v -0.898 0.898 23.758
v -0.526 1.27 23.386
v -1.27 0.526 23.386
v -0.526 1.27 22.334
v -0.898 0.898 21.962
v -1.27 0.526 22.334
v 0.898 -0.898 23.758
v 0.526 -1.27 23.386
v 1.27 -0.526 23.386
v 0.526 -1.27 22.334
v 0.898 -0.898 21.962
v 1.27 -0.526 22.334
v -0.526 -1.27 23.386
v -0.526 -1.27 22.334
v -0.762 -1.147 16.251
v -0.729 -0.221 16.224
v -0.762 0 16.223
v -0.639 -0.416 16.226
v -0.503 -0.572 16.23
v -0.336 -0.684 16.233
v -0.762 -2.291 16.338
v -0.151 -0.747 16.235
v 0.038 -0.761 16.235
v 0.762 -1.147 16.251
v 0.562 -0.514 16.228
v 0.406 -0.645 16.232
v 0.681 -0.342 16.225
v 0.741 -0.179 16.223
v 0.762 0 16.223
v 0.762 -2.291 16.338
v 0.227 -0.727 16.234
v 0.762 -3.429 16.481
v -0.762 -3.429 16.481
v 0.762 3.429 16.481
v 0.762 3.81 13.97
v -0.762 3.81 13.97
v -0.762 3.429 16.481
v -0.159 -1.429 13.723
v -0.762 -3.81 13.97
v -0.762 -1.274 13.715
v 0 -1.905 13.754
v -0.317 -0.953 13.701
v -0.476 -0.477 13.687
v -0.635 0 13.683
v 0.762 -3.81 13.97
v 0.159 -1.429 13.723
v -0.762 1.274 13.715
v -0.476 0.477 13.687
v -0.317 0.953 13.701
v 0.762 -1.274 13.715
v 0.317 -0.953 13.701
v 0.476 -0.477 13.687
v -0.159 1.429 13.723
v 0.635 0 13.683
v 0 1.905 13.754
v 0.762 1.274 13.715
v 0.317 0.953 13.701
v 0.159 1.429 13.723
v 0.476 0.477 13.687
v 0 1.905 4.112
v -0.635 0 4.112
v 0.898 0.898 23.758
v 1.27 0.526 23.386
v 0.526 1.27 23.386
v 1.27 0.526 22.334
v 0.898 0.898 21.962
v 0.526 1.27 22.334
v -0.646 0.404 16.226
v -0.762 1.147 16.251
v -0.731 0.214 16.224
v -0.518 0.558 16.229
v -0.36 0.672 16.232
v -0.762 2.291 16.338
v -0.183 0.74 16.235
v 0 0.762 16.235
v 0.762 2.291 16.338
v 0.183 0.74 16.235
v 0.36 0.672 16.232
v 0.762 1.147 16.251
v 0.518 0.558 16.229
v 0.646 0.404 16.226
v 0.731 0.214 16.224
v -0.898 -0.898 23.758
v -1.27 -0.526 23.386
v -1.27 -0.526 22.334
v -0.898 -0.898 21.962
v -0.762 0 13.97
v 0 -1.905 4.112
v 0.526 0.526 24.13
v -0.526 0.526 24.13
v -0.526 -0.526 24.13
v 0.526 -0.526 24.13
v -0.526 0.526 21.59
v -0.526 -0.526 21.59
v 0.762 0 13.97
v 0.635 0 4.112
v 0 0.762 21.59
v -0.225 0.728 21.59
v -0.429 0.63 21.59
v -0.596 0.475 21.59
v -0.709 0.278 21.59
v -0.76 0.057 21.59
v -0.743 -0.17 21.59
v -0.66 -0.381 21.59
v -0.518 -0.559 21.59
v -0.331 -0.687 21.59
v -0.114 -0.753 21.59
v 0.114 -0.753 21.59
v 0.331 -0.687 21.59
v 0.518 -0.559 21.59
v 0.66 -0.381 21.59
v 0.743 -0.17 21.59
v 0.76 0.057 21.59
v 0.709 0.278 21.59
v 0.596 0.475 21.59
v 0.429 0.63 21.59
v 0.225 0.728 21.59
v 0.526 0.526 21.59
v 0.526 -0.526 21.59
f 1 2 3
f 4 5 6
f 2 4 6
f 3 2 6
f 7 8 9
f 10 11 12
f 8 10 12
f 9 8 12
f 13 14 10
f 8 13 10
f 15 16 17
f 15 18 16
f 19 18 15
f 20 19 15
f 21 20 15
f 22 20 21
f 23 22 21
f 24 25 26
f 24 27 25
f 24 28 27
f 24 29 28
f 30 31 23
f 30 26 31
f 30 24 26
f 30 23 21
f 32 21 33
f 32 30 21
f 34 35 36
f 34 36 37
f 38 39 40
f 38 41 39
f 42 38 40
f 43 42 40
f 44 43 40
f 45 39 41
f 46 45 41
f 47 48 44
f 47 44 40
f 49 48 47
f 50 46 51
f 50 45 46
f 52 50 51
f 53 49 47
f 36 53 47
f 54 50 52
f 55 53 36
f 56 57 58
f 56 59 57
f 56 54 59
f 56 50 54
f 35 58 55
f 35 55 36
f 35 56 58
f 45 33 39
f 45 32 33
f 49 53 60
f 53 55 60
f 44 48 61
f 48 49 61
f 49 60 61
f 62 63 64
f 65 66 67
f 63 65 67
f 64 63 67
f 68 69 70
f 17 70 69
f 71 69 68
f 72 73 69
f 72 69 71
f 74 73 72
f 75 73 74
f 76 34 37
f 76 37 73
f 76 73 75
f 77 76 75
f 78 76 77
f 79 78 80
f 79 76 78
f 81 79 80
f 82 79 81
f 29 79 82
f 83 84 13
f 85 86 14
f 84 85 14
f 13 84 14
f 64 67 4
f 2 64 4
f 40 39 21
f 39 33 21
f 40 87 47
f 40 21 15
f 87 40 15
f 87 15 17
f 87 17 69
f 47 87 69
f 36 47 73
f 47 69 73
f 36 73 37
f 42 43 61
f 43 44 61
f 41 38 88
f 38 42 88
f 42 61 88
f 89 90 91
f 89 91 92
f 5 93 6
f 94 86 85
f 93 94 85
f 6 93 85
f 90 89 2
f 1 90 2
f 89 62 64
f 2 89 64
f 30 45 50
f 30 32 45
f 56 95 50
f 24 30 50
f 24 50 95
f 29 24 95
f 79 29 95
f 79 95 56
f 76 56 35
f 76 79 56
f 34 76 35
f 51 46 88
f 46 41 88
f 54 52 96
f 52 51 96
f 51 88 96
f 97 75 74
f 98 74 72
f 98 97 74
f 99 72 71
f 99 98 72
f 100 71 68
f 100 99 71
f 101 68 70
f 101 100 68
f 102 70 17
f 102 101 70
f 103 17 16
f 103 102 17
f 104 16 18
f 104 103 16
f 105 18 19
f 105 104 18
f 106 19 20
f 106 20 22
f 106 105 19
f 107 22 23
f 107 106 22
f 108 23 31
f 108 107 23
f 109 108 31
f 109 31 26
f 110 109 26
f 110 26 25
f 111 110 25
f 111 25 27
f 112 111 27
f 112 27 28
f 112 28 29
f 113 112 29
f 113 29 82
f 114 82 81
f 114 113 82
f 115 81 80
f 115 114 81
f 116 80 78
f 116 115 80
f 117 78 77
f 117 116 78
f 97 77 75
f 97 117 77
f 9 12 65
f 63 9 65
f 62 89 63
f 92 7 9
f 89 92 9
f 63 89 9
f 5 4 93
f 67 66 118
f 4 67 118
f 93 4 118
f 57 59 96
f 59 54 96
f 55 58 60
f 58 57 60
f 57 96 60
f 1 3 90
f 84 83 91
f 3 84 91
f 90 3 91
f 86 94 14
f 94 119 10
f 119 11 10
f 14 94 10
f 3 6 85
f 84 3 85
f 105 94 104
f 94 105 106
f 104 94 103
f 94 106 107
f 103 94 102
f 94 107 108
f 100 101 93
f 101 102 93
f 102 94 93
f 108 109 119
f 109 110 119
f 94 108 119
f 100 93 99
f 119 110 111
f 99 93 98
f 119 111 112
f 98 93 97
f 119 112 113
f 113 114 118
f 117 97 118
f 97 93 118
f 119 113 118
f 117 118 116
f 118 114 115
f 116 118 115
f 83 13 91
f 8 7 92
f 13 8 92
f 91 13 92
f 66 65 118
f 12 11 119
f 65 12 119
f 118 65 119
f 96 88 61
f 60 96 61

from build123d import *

# Parameters (mm, degrees)
F0_R      = 6.35
F1_DEPTH  = 1.5875
F2_R      = 6.35
F2_R_2    = 5.715
F3_DEPTH  = 0.79375
F5_DEPTH  = 12.7
F7_DEPTH  = 0.762
F8_W      = 0.762
F8_H      = 7.62
F11_DEPTH = 2.54
F13_DEPTH = 25.4
F15_DEPTH = 7.621
F16_W     = 24.9132402241
F16_H     = 7.0053068921
F17_DEPTH = 12.7


# Not quite as in the source:
# - a feature names something its author has since deleted; it is built from what else it names


with BuildPart() as f1:
    # F0 (on Top) → F1 (new body)
    with BuildSketch(Plane.XY):
        Circle(F0_R)
    extrude(amount=F1_DEPTH)

    # F2 (on face) → F3 (join)
    with BuildSketch(Plane.XY.offset(1.5875)):
        Circle(F2_R)
        Circle(F2_R_2, mode=Mode.SUBTRACT)
        with BuildLine():
            add(Edge.make_bspline(
                [(2.9683180619, -0.4757996358), (2.843389073, -0.4786165828), (2.7050840949, -0.5086647904), (2.5873180619, -0.5161623703)],
                knots=[0.409339872, 0.409339872, 0.409339872, 0.409339872, 0.4280905329, 0.4280905329, 0.4280905329, 0.4280905329], degree=3))
            add(Edge.make_bspline(
                [(2.5873180619, -0.5161623703), (2.4915986751, -0.5222563495), (2.3352190965, -0.5054979102), (2.1335509903, -0.5700528844), (1.886210527, -0.6696578597), (1.7267290127, -0.8313152566), (1.6781527788, -1.0212940602), (1.5990320903, -1.1897273451), (1.6464089719, -1.2957044031), (1.5599711629, -1.4279363767), (1.5051186748, -1.5717824942), (1.450980873, -1.6442395094), (1.453928646, -1.7165163565), (1.513053832, -1.7807591134), (1.5434308822, -1.8303185726), (1.576198943, -1.9162350186), (1.5055990352, -1.9919946196), (1.4668165836, -2.0222182295), (1.4097694676, -2.0618705924), (1.4071401198, -2.0762813928), (1.407019912, -2.0936682429), (1.4054410858, -2.1159814671), (1.4256709316, -2.1343567811), (1.4482180902, -2.1520382899), (1.5329915239, -2.3033090939), (1.6303822196, -2.3814989965), (1.5935632797, -2.4623744081), (1.5348318369, -2.4983128964), (1.4776982069, -2.5441298885), (1.455742429, -2.5511454253), (1.4798178263, -2.5621456444), (1.4948688399, -2.5838079134), (1.5251861888, -2.6046329809), (1.4935773749, -2.6345303194), (1.4713860455, -2.6758526458), (1.4221955197, -2.712885243), (1.3936565716, -2.7915463541), (1.4945229102, -2.8204202545), (1.6288484983, -2.8640100665), (1.7728549214, -2.853346582), (1.9116412442, -2.8061555548), (2.0472725737, -2.770170597), (2.2043787565, -2.7459265468), (2.3033355203, -2.7551939211), (2.3339263508, -2.8073911697), (2.353376687, -2.8775353249), (2.3257401171, -2.9468505336), (2.3037614678, -3.0393999235), (2.1498886548, -3.0666616669), (2.0714102198, -3.0904863786), (1.9727168734, -3.1134789891), (1.7843150368, -3.140535518), (1.6436061221, -3.1389483141), (1.5234236482, -3.1049579495), (1.4521295971, -3.0857303745), (1.4124230671, -3.1305535957), (1.4949213438, -3.1891776378), (1.5227733168, -3.2831967132), (1.4841449535, -3.3566867509), (1.4775180681, -3.4518910587), (1.4608440665, -3.566216612), (1.549729833, -3.6446920788), (1.8994677395, -3.667719288), (2.0536618712, -3.5673701183), (2.086254186, -3.5448411945)],
                knots=[0.4280905329, 0.4280905329, 0.4280905329, 0.4280905329, 0.4433309355, 0.457101701, 0.472691433, 0.4868290747, 0.5002944463, 0.5129981027, 0.5225928523, 0.5342722129, 0.5463608736, 0.5552384945, 0.5629095325, 0.5716491532, 0.5791344546, 0.5877870081, 0.596979654, 0.6042024841, 0.6118646332, 0.6153039035, 0.6192184677, 0.6236552276, 0.6283160232, 0.6333712575, 0.6459326281, 0.6564149698, 0.6642919572, 0.6725026939, 0.6807518007, 0.684185616, 0.6882292359, 0.6934969149, 0.6985507014, 0.7041050254, 0.7107743014, 0.7183805652, 0.7259377484, 0.7347425449, 0.7463542944, 0.7577985049, 0.7693099164, 0.780784325, 0.7929687375, 0.8020678672, 0.8090716285, 0.8170400104, 0.8252507415, 0.834055538, 0.845515778, 0.8543322878, 0.8638427207, 0.8770648317, 0.8886457092, 0.899333178, 0.9072373981, 0.9129559403, 0.9218532611, 0.9311181429, 0.9395692705, 0.9490169241, 0.9588418554, 0.9683094215, 0.9861710617, 1, 1, 1, 1], degree=3))
            add(Edge.make_bspline(
                [(2.086254186, -3.5448411945), (2.1011047055, -3.5345760071), (2.1201833918, -3.5199789546), (2.2133903471, -3.4742318908), (2.3333214203, -3.4513666992), (2.4607568415, -3.4062321353), (2.6387662736, -3.3641035898), (2.7563669715, -3.3392389367), (2.8861628847, -3.3278317932), (2.9202917573, -3.1985664964), (2.9487510475, -3.0806210272), (2.9453740986, -2.8830592898), (2.9475003966, -2.7801627945), (3.0024526725, -2.634440086), (3.0665778639, -2.4862895949), (3.1278419801, -2.4963691695), (3.2148748542, -2.5174044884), (3.2670738053, -2.6357726537), (3.300079047, -2.7251932385), (3.4018745991, -2.7381242004), (3.5380519165, -2.7491446387), (3.665083714, -2.6861808801), (3.7982425029, -2.6394629665), (3.9059135519, -2.5530868531), (4.0451426633, -2.4694400612), (4.1647565761, -2.2912192854), (4.2419872332, -2.1073390896), (4.3180155802, -1.9393229235), (4.3188699133, -1.6520894893), (4.249875342, -1.4134518517), (4.1905089106, -1.1973159772), (4.0374858266, -0.958444693), (3.8993633614, -0.7738144821), (3.5856153955, -0.5701629325), (3.286341595, -0.5131462763), (3.0825055806, -0.4732248916), (2.9683180619, -0.4757996358)],
                knots=[0, 0, 0, 0, 0.0063010841, 0.0157194351, 0.0263949763, 0.0376453369, 0.0505479911, 0.0613137498, 0.071480671, 0.0817330319, 0.0926649823, 0.1059401058, 0.1157236868, 0.1278653869, 0.1394743491, 0.1461226676, 0.1548216508, 0.1655548739, 0.1745318922, 0.1836808664, 0.1948523405, 0.2062053504, 0.2175283386, 0.2286731355, 0.2407902953, 0.2547394428, 0.2682405406, 0.2811697816, 0.2972000982, 0.3123569589, 0.3266907485, 0.3425591711, 0.3572627122, 0.3754272219, 0.3922014044, 0.409339872, 0.409339872, 0.409339872, 0.409339872], degree=3))
        make_face()
        with BuildLine():
            add(Edge.make_bspline(
                [(1.6971518053, -1.7743168864), (1.6817021758, -1.7925924294), (1.6769970047, -1.8625052871), (1.729693431, -1.9463010045), (1.7845566819, -2.0039238946), (1.7796195304, -2.0789246327), (1.7537680377, -2.1257688745), (1.8014879536, -2.2093126279), (1.9177102455, -2.1779080217), (1.965096075, -2.0707704095), (1.9605129281, -1.9856512165), (1.9580791022, -1.8944092615), (1.8839995072, -1.8212095405), (1.8202543113, -1.7813944492), (1.7573140981, -1.749016499), (1.7102858438, -1.7587804824), (1.6971518053, -1.7743168864)],
                knots=[0, 0, 0, 0, 0.0723902032, 0.1521785163, 0.2220894047, 0.2876074386, 0.3444825904, 0.4130481958, 0.4920977039, 0.5756332962, 0.6493011321, 0.723443126, 0.8024927151, 0.8724037498, 0.9384596426, 1, 1, 1, 1], degree=3))
        make_face(mode=Mode.SUBTRACT)
        with BuildLine():
            add(Edge.make_bspline(
                [(-2.4699478998, -0.4572949838), (-2.5708650863, -0.4563367572), (-2.7369839982, -0.4424518124), (-2.9380629804, -0.5061475005), (-3.1861355879, -0.6061766595), (-3.3454329941, -0.7677273894), (-3.3940542763, -0.9577322927), (-3.4731643105, -1.1261594047), (-3.4257896257, -1.2321377355), (-3.5122267839, -1.364369332), (-3.5670794532, -1.5082155546), (-3.6212172198, -1.5806725493), (-3.6182694543, -1.6529494008), (-3.5591442662, -1.7171921565), (-3.5287672166, -1.766751616), (-3.4959991555, -1.8526680619), (-3.5665990634, -1.9284276629), (-3.605381515, -1.9586512728), (-3.662428631, -1.9983036357), (-3.6650579788, -2.0127144361), (-3.6651781866, -2.0301012863), (-3.6667570128, -2.0524145104), (-3.646527167, -2.0707898244), (-3.6239800084, -2.0884713333), (-3.5392065747, -2.2397421372), (-3.441815879, -2.3179320399), (-3.4786348188, -2.3988074514), (-3.5373662617, -2.4347459398), (-3.5944998917, -2.4805629318), (-3.6164556696, -2.4875784687), (-3.5923802723, -2.4985786877), (-3.5773292587, -2.5202409567), (-3.5470119098, -2.5410660242), (-3.5786207237, -2.5709633628), (-3.600812053, -2.6122856891), (-3.6500025789, -2.6493182863), (-3.678541527, -2.7279793974), (-3.5776751884, -2.7568532979), (-3.4433496003, -2.8004431099), (-3.2993431772, -2.7897796254), (-3.1605568544, -2.7425885981), (-3.0249255249, -2.7066036403), (-2.8678193421, -2.6823595901), (-2.7688625783, -2.6916269644), (-2.7382717478, -2.743824213), (-2.7188214116, -2.8139683683), (-2.7464579815, -2.8832835769), (-2.7684366308, -2.9758329669), (-2.9223094438, -3.0030947102), (-3.0007878788, -3.026919422), (-3.0994812252, -3.0499120324), (-3.2878830618, -3.0769685613), (-3.4285919765, -3.0753813574), (-3.5487744504, -3.0413909928), (-3.6200685015, -3.0221634179), (-3.6597750314, -3.066986639), (-3.5772767548, -3.1256106812), (-3.5494247818, -3.2196297565), (-3.5880531451, -3.2931197942), (-3.5946800305, -3.388324102), (-3.6113540321, -3.5026496554), (-3.5224682656, -3.5811251221), (-3.1727303591, -3.6041523313), (-3.0185362274, -3.5038031616), (-2.9859439126, -3.4812742379)],
                knots=[0.4276093612, 0.4276093612, 0.4276093612, 0.4276093612, 0.4432926757, 0.4570643878, 0.4726551912, 0.4867938046, 0.5002601016, 0.5129646311, 0.5225600402, 0.5342402035, 0.5463296951, 0.5552079262, 0.5628794914, 0.5716197128, 0.5791055286, 0.5877586768, 0.5969519545, 0.604175281, 0.6118379567, 0.6152774634, 0.6191922967, 0.6236293616, 0.6282904775, 0.6333460592, 0.6459082931, 0.6563913553, 0.6642688841, 0.6724801851, 0.6807298588, 0.6841639101, 0.688207808, 0.693475849, 0.6985299829, 0.7040846887, 0.710754423, 0.7183612095, 0.7259189122, 0.7347243139, 0.7463368614, 0.7577818585, 0.7692940611, 0.7807692583, 0.7929545082, 0.8020542633, 0.809058506, 0.8170274356, 0.825238731, 0.8340441327, 0.8455051603, 0.8543222761, 0.8638333627, 0.8770563824, 0.8886380559, 0.8993262592, 0.9072310226, 0.9129499578, 0.9218478901, 0.9311134087, 0.9395651171, 0.9490134201, 0.9588390266, 0.9683072434, 0.9861701112, 1, 1, 1, 1], degree=3))
            add(Edge.make_bspline(
                [(-2.9859439126, -3.4812742379), (-2.9710933931, -3.4710090504), (-2.9520147068, -3.456411998), (-2.8588077515, -3.4106649341), (-2.7388766783, -3.3877997425), (-2.6114412571, -3.3426651787), (-2.433431825, -3.3005366331), (-2.3158311271, -3.27567198), (-2.1860352139, -3.2642648366), (-2.1519063413, -3.1349995397), (-2.1234470511, -3.0170540705), (-2.1268239999, -2.8194923331), (-2.1246977019, -2.7165958378), (-2.0697454261, -2.5708731293), (-2.0056202347, -2.4227226382), (-1.9443561185, -2.4328022129), (-1.8573232444, -2.4538375317), (-1.8051242933, -2.5722056971), (-1.7721190516, -2.6616262819), (-1.6703234995, -2.6745572438), (-1.5341461821, -2.685577682), (-1.4071143845, -2.6226139237), (-1.2739555958, -2.5758960088), (-1.1662845461, -2.4895199003), (-1.0270554378, -2.4058730873), (-0.9074415115, -2.2276524028), (-0.830210904, -2.0437718725), (-0.7541823669, -1.8757569873), (-0.753328888, -1.5885177996), (-0.8223203653, -1.3499010029), (-0.8816979637, -1.1336899083), (-1.0346766678, -0.8951175642), (-1.1729684536, -0.7093468208), (-1.4859704608, -0.5107200004), (-1.7852685997, -0.4361256058), (-1.9796795123, -0.4407184694), (-2.0889478998, -0.4452950088)],
                knots=[0, 0, 0, 0, 0.0063015172, 0.0157205155, 0.0263967904, 0.0376479243, 0.0505514652, 0.0613179639, 0.0714855839, 0.0817386494, 0.0926713511, 0.1059473871, 0.1157316405, 0.1278741751, 0.1394839351, 0.1461327105, 0.1548322917, 0.1655662524, 0.1745438878, 0.1836934908, 0.1948657327, 0.2062195229, 0.2175432893, 0.2286888521, 0.2408068447, 0.254756951, 0.2682589767, 0.2811891063, 0.2972205247, 0.3123784271, 0.3267132019, 0.3425827151, 0.3572872668, 0.3754530249, 0.3922283603, 0.4089050235, 0.4089050235, 0.4089050235, 0.4089050235], degree=3))
            add(Edge.make_bspline(
                [(-2.0889478998, -0.4452950088), (-2.2115019627, -0.4504279985), (-2.3495913807, -0.4584377902), (-2.4699478998, -0.4572949838)],
                knots=[0.4089050235, 0.4089050235, 0.4089050235, 0.4089050235, 0.4276093612, 0.4276093612, 0.4276093612, 0.4276093612], degree=3))
        make_face()
        with BuildLine():
            add(Edge.make_bspline(
                [(-3.3750462933, -1.7107499298), (-3.3904959228, -1.7290254728), (-3.3952010939, -1.7989383304), (-3.3425046676, -1.8827340479), (-3.2876414167, -1.940356938), (-3.2925785682, -2.015357676), (-3.3184300609, -2.0622019178), (-3.270710145, -2.1457456712), (-3.1544878531, -2.114341065), (-3.1071020236, -2.0072034528), (-3.1116851705, -1.9220842599), (-3.1141189964, -1.8308423049), (-3.1881985914, -1.7576425838), (-3.2519437873, -1.7178274925), (-3.3148840005, -1.6854495423), (-3.3619122548, -1.6952135257), (-3.3750462933, -1.7107499298)],
                knots=[0, 0, 0, 0, 0.0723902032, 0.1521785163, 0.2220894047, 0.2876074386, 0.3444825904, 0.4130481958, 0.4920977039, 0.5756332962, 0.6493011321, 0.723443126, 0.8024927151, 0.8724037498, 0.9384596426, 1, 1, 1, 1], degree=3))
        make_face(mode=Mode.SUBTRACT)
        with BuildLine():
            add(Edge.make_bspline(
                [(-2.0889478998, -0.4452950088), (-2.2115019627, -0.4504279985), (-2.3495913807, -0.4584377902), (-2.4699478998, -0.4572949838)],
                knots=[0.4089050235, 0.4089050235, 0.4089050235, 0.4089050235, 0.4276093612, 0.4276093612, 0.4276093612, 0.4276093612], degree=3))
            Line((-2.0889478998, -0.4452950088), (-2.0889478998, 3.3454788989))
            Line((-2.0889478998, 3.3454788989), (2.5873180619, 3.3454788989))
            Line((2.5873180619, 3.3454788989), (2.5873180619, -0.5161623703))
            add(Edge.make_bspline(
                [(2.9683180619, -0.4757996358), (2.843389073, -0.4786165828), (2.7050840949, -0.5086647904), (2.5873180619, -0.5161623703)],
                knots=[0.409339872, 0.409339872, 0.409339872, 0.409339872, 0.4280905329, 0.4280905329, 0.4280905329, 0.4280905329], degree=3))
            Line((2.9683180619, -0.4757996358), (2.9683180619, 3.7264788989))
            Line((2.9683180619, 3.7264788989), (-2.4699478998, 3.7264788989))
            Line((-2.4699478998, 3.7264788989), (-2.4699478998, -0.4572949838))
        make_face()
        with BuildLine():
            Line((-3.550226207, -2.9001818039), (-3.550226207, -2.8240964748))
            ThreePointArc((-3.550226207, -2.8240964748), (-3.6131554429, -2.8177576011), (-3.6389924242, -2.8754873201))
            Line((-3.6389924242, -2.8754873201), (-3.550226207, -2.9001818039))
        make_face()
        with BuildLine():
            Line((-3.5515612579, -2.9365690425), (-3.6409947677, -2.9101930559))
            ThreePointArc((-3.6409947677, -2.9101930559), (-3.6144088936, -2.9743756743), (-3.550226207, -3.0009613838))
            Line((-3.550226207, -3.0009613838), (-3.5515612579, -2.9365690425))
        make_face()
        Polygon((-3.4440558991, -2.9486666899), (-3.5156634292, -2.9365690425), (-3.5175228148, -3.00363102), (-3.4440558991, -3.0129749794), align=None)
        Polygon((-3.443260084, -2.8461508919), (-3.5195409908, -2.832378028), (-3.5195409908, -2.903361572), (-3.443260084, -2.9181940481), align=None)
        Polygon((-3.3330767072, -2.8514482547), (-3.4114763728, -2.849329263), (-3.4114763728, -2.9171344358), (-3.3330767072, -2.920312807), align=None)
        Polygon((-3.3340308471, -3.0290670693), (-3.3340308471, -2.9517051298), (-3.4147564909, -2.9517051298), (-3.4147564909, -3.0172944535), align=None)
        Polygon((-3.2263969659, -3.028226085), (-3.2272379501, -2.9517051298), (-3.300395201, -2.9517051298), (-3.300395201, -3.028226085), align=None)
        Polygon((-3.2250125549, -2.8408537619), (-3.301292996, -2.849329263), (-3.301292996, -2.9192534275), (-3.2239527098, -2.9192534275), align=None)
        Polygon((-3.1221265561, -2.8121171053), (-3.195283807, -2.8314576484), (-3.195283807, -2.9155467637), (-3.1221265561, -2.8995696921), align=None)
        Polygon((-3.1212855718, -3.011408262), (-3.1204445875, -2.9365690425), (-3.1927613198, -2.9466596898), (-3.1919203355, -3.0214989092), align=None)
        Polygon((-3.005242779, -2.9836588074), (-3.0086062505, -2.9075582279), (-3.0876499257, -2.9239556752), (-3.0859684228, -3.0046810862), align=None)
        Polygon((-3.0060837633, -2.768390812), (-3.0859684228, -2.7952992823), (-3.0859684228, -2.8920017648), (-3.0060837633, -2.8692977503), align=None)
        Polygon((-2.9043358407, -2.7322324459), (-2.9766525729, -2.7549366932), (-2.9766525729, -2.859207103), (-2.9043358407, -2.8314576484), align=None)
        Polygon((-2.9758115886, -2.9744091444), (-2.9043358407, -2.9483414255), (-2.9043358407, -2.868456766), (-2.9758115886, -2.8920017648), align=None)
        with BuildLine():
            ThreePointArc((-2.8761449157, -2.9407734983), (-2.7976867204, -2.8913213797), (-2.7672707691, -2.8037081938))
            Line((-2.7672707691, -2.8037081938), (-2.8761449157, -2.8519913538))
            Line((-2.8761449157, -2.8519913538), (-2.8761449157, -2.9407734983))
        make_face()
        with BuildLine():
            ThreePointArc((-2.7748386963, -2.7717545163), (-2.8160666547, -2.7335813761), (-2.8715411789, -2.7246645186))
            Line((-2.8715411789, -2.7246645186), (-2.8715411789, -2.8146398254))
            Line((-2.8715411789, -2.8146398254), (-2.7748386963, -2.7717545163))
        make_face()
        with BuildLine():
            ThreePointArc((2.2973594023, -2.835321473), (2.2561314439, -2.7971483328), (2.2006569197, -2.7882314753))
            Line((2.2006569197, -2.7882314753), (2.2006569197, -2.878206782))
            Line((2.2006569197, -2.878206782), (2.2973594023, -2.835321473))
        make_face()
        with BuildLine():
            ThreePointArc((2.1960531829, -3.0043404549), (2.2745113782, -2.9548883364), (2.3049273295, -2.8672751505))
            Line((2.3049273295, -2.8672751505), (2.1960531829, -2.9155583104))
            Line((2.1960531829, -2.9155583104), (2.1960531829, -3.0043404549))
        make_face()
        Polygon((2.0963865099, -3.037976101), (2.1678622579, -3.0119083822), (2.1678622579, -2.9320237227), (2.0963865099, -2.9555687215), align=None)
        Polygon((2.1678622579, -2.7957994025), (2.0955455257, -2.8185036499), (2.0955455257, -2.9227740597), (2.1678622579, -2.8950246051), align=None)
        Polygon((2.0661143353, -2.8319577686), (1.9862296758, -2.858866239), (1.9862296758, -2.9555687215), (2.0661143353, -2.932864707), align=None)
        Polygon((2.0669553196, -3.047225764), (2.0635918481, -2.9711251846), (1.9845481729, -2.9875226319), (1.9862296758, -3.0682480428), align=None)
        Polygon((1.9509125268, -3.0749752186), (1.9517535111, -3.0001359992), (1.8794367788, -3.0102266464), (1.8802777631, -3.0850658659), align=None)
        Polygon((1.9500715425, -2.875684062), (1.8769142916, -2.8950246051), (1.8769142916, -2.9791137204), (1.9500715425, -2.9631366488), align=None)
        Polygon((1.8471855437, -2.9044207186), (1.7709051026, -2.9128962196), (1.7709051026, -2.9828203842), (1.8482453888, -2.9828203842), align=None)
        Polygon((1.8458011327, -3.0917930417), (1.8449601484, -3.0152720865), (1.7718028976, -3.0152720865), (1.7718028976, -3.0917930417), align=None)
        Polygon((1.7381672515, -3.092634026), (1.7381672515, -3.0152720865), (1.6574416077, -3.0152720865), (1.6574416077, -3.0808614101), align=None)
        Polygon((1.7391213914, -2.9150152113), (1.6607217258, -2.9128962196), (1.6607217258, -2.9807013925), (1.7391213914, -2.9838797636), align=None)
        Polygon((1.6289380146, -2.9097178485), (1.5526571078, -2.8959449846), (1.5526571078, -2.9669285286), (1.6289380146, -2.9817610048), align=None)
        Polygon((1.6281421995, -3.0122336466), (1.5565346694, -3.0001359992), (1.5546752838, -3.0671979766), (1.6281421995, -3.076541936), align=None)
        with BuildLine():
            Line((1.5206368407, -3.0001359992), (1.4312033309, -2.9737600125))
            ThreePointArc((1.4312033309, -2.9737600125), (1.457789205, -3.037942631), (1.5219718916, -3.0645283405))
            Line((1.5219718916, -3.0645283405), (1.5206368407, -3.0001359992))
        make_face()
        with BuildLine():
            Line((1.5219718916, -2.9637487605), (1.5219718916, -2.8876634315))
            ThreePointArc((1.5219718916, -2.8876634315), (1.4590426557, -2.8813245578), (1.4332056744, -2.9390542768))
            Line((1.4332056744, -2.9390542768), (1.5219718916, -2.9637487605))
        make_face()
    extrude(amount=F3_DEPTH)

    # F4 (on face) → F5 (join)
    with BuildSketch(Plane.XY.offset(1.5875)):
        Polygon((0.635, 0), (0, 1.905), (-0.635, 0), (0, -1.905), align=None)
    extrude(amount=F5_DEPTH)

    # F6 (on Right) → F7 (join, symmetric)
    with BuildSketch(Plane.YZ):
        with BuildLine():
            ThreePointArc((-3.81, 13.97), (0, 13.6826243153), (3.81, 13.97))
            Line((3.81, 13.97), (3.429, 16.4812624315))
            ThreePointArc((3.429, 16.4812624315), (0, 16.2226243153), (-3.429, 16.4812624315))
            Line((-3.429, 16.4812624315), (-3.81, 13.97))
        make_face()
    extrude(amount=F7_DEPTH, both=True)

    # F8 (on Right) → F9 (revolve)
    with BuildSketch(Plane.YZ):
        with Locations((0.381, 17.78)):
            Rectangle(F8_W, F8_H)
    revolve(axis=Axis((0, 0, 17.78), (0, 0, 1)))

    # F10 (on face) → F11 (join)
    with BuildSketch(Plane.XY.offset(21.59)):
        Polygon((-0.5260512242, -1.27), (0.5260512242, -1.27), (1.27, -0.5260512242), (1.27, 0.5260512242), (0.5260512242, 1.27), (-0.5260512242, 1.27), (-1.27, 0.5260512242), (-1.27, -0.5260512242), align=None)
    extrude(amount=F11_DEPTH)

    # F12 (on face) → F13 (cut)
    with BuildSketch(Plane.YZ.offset(1.27)):
        Polygon((1.27, 22.3339487758), (0.5260512242, 21.59), (1.27, 21.59), align=None)
        Polygon((-1.27, 21.59), (-0.5260512242, 21.59), (-1.27, 22.3339487758), align=None)
        Polygon((-1.27, 23.3860512242), (-0.5260512242, 24.13), (-1.27, 24.13), align=None)
        Polygon((1.27, 24.13), (0.5260512242, 24.13), (1.27, 23.3860512242), align=None)
    extrude(amount=-F13_DEPTH, mode=Mode.SUBTRACT)

    # F14 (on face) → F15 (cut, through all)
    with BuildSketch(Plane.XZ.offset(1.27)):
        Polygon((1.27, 21.59), (1.27, 22.3339487758), (0.5260512242, 21.59), align=None)
        Polygon((-1.27, 21.59), (-0.5260512242, 21.59), (-1.27, 22.3339487758), align=None)
        Polygon((-1.27, 23.3860512242), (-0.5260512242, 24.13), (-1.27, 24.13), align=None)
        Polygon((0.5260512242, 24.13), (1.27, 23.3860512242), (1.27, 24.13), align=None)
    extrude(amount=-F15_DEPTH, mode=Mode.SUBTRACT)

    # F16 (on face) → F17 (cut, symmetric)
    with BuildSketch(Plane.YZ.offset(0.762)):
        with Locations((3.815677017, 0.6096903235)):
            Rectangle(F16_W, F16_H)
    extrude(amount=F17_DEPTH, both=True, mode=Mode.SUBTRACT)


solid = f1.part
